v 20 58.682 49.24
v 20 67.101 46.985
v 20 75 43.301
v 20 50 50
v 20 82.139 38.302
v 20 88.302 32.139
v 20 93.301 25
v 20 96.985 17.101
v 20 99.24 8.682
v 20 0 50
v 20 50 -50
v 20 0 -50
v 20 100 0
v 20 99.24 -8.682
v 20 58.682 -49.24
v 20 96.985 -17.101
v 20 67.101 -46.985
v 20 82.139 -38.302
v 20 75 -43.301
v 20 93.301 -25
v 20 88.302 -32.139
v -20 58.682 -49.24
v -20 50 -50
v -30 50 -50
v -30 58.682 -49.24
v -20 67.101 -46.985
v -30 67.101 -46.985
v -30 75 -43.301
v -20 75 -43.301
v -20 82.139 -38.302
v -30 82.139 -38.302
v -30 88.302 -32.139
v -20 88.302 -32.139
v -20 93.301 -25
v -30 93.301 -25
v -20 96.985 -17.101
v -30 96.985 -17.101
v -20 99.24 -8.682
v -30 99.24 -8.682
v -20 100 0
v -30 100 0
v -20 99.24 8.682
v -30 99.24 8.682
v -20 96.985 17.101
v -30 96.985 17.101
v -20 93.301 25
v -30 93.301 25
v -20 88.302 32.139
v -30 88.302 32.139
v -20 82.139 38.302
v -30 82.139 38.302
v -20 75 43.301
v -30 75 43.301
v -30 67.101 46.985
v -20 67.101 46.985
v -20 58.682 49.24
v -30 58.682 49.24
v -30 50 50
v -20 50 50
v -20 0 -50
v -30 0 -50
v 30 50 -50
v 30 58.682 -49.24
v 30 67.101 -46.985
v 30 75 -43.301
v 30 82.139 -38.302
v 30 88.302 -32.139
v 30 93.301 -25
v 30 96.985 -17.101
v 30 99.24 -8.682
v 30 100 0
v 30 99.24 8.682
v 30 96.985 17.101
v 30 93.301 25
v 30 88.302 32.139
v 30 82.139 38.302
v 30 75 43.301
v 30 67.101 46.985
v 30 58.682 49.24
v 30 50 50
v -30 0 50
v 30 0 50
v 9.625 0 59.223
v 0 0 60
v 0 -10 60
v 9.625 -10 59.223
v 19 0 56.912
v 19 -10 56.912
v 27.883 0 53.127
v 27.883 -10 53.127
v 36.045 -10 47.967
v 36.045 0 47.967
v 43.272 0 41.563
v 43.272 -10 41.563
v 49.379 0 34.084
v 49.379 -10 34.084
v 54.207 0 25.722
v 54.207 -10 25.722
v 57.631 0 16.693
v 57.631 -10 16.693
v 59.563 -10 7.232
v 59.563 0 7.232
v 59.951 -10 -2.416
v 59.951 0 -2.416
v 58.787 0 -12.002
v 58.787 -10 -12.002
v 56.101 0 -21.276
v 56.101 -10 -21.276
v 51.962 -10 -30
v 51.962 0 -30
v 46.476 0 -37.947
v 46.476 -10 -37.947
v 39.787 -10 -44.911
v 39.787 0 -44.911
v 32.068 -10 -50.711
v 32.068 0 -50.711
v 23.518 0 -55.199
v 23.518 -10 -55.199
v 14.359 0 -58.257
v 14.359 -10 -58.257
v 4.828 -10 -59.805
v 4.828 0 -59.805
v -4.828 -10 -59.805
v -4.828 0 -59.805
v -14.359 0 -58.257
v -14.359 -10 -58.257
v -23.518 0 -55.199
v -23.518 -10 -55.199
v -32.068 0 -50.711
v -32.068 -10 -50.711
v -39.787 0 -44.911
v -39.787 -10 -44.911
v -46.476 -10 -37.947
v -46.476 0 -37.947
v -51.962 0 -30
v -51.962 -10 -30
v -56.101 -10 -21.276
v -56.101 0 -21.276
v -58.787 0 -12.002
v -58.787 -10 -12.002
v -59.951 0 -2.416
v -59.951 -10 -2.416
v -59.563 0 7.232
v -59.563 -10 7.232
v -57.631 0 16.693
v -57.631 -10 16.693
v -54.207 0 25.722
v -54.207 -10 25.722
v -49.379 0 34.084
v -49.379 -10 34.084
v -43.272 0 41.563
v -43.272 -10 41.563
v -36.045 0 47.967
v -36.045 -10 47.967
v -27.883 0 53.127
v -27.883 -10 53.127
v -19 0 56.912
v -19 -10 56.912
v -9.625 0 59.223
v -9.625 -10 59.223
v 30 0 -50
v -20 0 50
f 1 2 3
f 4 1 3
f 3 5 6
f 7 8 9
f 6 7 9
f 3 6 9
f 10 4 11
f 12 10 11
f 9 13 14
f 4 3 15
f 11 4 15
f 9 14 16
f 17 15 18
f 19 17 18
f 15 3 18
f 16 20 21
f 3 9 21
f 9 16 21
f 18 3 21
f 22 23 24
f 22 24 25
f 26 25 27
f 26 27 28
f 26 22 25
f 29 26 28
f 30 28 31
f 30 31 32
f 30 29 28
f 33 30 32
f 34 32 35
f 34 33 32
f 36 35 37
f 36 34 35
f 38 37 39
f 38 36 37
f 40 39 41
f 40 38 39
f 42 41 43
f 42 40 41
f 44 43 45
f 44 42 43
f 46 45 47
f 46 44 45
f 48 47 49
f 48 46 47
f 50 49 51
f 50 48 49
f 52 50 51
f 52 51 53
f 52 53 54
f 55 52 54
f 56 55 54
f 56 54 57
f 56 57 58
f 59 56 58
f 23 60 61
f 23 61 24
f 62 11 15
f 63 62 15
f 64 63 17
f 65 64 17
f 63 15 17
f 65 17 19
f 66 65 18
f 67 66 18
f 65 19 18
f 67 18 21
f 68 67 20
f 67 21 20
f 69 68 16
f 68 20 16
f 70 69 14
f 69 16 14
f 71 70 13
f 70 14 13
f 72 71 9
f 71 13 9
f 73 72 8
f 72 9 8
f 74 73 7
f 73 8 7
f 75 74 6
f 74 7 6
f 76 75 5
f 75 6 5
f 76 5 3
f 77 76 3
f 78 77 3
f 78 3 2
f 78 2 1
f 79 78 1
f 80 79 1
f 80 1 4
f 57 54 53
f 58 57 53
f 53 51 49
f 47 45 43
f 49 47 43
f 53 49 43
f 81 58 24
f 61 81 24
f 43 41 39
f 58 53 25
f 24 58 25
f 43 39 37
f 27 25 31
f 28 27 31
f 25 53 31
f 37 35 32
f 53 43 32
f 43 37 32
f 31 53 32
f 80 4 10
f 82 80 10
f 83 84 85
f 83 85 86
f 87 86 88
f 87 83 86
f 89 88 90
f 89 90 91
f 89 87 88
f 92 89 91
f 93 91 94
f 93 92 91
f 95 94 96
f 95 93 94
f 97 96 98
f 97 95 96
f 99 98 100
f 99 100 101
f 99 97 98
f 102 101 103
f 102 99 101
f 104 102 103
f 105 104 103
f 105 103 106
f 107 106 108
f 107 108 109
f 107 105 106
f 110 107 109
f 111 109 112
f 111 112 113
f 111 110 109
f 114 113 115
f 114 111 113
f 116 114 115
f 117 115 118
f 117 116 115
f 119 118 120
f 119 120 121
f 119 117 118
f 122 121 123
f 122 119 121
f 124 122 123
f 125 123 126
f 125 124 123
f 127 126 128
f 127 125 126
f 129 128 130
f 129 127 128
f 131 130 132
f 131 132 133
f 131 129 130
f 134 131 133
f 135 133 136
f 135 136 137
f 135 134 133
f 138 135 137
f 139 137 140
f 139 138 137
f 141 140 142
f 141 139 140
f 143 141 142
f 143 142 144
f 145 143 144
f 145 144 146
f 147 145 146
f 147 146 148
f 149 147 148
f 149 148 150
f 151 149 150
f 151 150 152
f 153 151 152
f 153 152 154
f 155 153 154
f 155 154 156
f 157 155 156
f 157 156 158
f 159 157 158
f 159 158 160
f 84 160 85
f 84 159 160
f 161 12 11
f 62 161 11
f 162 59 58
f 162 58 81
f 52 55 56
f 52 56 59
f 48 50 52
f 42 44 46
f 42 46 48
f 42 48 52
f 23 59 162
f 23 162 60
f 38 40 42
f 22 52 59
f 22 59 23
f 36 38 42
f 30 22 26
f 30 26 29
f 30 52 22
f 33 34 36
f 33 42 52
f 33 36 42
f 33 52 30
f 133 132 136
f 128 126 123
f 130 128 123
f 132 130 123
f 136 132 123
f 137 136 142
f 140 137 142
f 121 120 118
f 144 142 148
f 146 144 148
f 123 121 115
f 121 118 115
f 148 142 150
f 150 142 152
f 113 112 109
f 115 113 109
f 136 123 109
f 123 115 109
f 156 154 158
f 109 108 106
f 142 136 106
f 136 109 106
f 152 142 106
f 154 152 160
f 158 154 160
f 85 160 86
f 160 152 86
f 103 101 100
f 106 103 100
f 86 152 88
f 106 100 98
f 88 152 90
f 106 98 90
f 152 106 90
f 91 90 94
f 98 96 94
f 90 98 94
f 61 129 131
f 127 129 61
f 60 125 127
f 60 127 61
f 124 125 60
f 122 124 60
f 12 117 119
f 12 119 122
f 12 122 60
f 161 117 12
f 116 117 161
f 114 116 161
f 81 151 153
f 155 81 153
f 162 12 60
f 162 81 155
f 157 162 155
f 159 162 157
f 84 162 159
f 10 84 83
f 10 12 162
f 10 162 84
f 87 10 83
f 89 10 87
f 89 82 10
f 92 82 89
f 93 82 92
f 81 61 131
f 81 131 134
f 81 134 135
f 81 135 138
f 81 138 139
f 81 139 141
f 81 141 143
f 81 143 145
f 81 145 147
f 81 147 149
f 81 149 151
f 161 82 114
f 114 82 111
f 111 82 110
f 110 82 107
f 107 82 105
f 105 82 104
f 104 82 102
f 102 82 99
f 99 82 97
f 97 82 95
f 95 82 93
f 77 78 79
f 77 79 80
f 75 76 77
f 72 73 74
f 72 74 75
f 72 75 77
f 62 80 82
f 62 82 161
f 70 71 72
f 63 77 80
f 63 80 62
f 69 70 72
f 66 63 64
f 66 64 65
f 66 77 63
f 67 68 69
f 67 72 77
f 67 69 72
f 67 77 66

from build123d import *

# Parameters (mm, degrees)
SKETCH1_R           = 60
BOSS_EXTRUDE1_DEPTH = 10
BOSS_EXTRUDE2_START = 20
BOSS_EXTRUDE2_DEPTH = 10


with BuildPart() as part:
    # Sketch1 → Boss-Extrude1 (new body)
    with BuildSketch(Plane(origin=(0, 0, 0), x_dir=(1, 0, 0), z_dir=(0, 1, 0))):
        with Locations(Location((0, 0, 0), (0, 0, 270))):
            Circle(SKETCH1_R)
    extrude(amount=-BOSS_EXTRUDE1_DEPTH)

    # Sketch2 → Boss-Extrude2 (add)
    with BuildSketch(Plane(origin=(0, 0, 0), x_dir=(0, 0, -1), z_dir=(1, 0, 0)).offset(BOSS_EXTRUDE2_START)):
        with BuildLine():
            Line((0, 0), (50, 0))
            Line((50, 0), (50, 50))
            ThreePointArc((50, 50), (0, 100), (-50, 50))
            Line((-50, 50), (-50, 0))
            Line((-50, 0), (0, 0))
        make_face()
    boss_extrude2 = extrude(amount=BOSS_EXTRUDE2_DEPTH)

    # Mirror1: Boss-Extrude2 across plane
    add(boss_extrude2.mirror(Plane(origin=(0, 0, 0), x_dir=(0, 0, 1), z_dir=(1, 0, 0))))


solid = part.part
